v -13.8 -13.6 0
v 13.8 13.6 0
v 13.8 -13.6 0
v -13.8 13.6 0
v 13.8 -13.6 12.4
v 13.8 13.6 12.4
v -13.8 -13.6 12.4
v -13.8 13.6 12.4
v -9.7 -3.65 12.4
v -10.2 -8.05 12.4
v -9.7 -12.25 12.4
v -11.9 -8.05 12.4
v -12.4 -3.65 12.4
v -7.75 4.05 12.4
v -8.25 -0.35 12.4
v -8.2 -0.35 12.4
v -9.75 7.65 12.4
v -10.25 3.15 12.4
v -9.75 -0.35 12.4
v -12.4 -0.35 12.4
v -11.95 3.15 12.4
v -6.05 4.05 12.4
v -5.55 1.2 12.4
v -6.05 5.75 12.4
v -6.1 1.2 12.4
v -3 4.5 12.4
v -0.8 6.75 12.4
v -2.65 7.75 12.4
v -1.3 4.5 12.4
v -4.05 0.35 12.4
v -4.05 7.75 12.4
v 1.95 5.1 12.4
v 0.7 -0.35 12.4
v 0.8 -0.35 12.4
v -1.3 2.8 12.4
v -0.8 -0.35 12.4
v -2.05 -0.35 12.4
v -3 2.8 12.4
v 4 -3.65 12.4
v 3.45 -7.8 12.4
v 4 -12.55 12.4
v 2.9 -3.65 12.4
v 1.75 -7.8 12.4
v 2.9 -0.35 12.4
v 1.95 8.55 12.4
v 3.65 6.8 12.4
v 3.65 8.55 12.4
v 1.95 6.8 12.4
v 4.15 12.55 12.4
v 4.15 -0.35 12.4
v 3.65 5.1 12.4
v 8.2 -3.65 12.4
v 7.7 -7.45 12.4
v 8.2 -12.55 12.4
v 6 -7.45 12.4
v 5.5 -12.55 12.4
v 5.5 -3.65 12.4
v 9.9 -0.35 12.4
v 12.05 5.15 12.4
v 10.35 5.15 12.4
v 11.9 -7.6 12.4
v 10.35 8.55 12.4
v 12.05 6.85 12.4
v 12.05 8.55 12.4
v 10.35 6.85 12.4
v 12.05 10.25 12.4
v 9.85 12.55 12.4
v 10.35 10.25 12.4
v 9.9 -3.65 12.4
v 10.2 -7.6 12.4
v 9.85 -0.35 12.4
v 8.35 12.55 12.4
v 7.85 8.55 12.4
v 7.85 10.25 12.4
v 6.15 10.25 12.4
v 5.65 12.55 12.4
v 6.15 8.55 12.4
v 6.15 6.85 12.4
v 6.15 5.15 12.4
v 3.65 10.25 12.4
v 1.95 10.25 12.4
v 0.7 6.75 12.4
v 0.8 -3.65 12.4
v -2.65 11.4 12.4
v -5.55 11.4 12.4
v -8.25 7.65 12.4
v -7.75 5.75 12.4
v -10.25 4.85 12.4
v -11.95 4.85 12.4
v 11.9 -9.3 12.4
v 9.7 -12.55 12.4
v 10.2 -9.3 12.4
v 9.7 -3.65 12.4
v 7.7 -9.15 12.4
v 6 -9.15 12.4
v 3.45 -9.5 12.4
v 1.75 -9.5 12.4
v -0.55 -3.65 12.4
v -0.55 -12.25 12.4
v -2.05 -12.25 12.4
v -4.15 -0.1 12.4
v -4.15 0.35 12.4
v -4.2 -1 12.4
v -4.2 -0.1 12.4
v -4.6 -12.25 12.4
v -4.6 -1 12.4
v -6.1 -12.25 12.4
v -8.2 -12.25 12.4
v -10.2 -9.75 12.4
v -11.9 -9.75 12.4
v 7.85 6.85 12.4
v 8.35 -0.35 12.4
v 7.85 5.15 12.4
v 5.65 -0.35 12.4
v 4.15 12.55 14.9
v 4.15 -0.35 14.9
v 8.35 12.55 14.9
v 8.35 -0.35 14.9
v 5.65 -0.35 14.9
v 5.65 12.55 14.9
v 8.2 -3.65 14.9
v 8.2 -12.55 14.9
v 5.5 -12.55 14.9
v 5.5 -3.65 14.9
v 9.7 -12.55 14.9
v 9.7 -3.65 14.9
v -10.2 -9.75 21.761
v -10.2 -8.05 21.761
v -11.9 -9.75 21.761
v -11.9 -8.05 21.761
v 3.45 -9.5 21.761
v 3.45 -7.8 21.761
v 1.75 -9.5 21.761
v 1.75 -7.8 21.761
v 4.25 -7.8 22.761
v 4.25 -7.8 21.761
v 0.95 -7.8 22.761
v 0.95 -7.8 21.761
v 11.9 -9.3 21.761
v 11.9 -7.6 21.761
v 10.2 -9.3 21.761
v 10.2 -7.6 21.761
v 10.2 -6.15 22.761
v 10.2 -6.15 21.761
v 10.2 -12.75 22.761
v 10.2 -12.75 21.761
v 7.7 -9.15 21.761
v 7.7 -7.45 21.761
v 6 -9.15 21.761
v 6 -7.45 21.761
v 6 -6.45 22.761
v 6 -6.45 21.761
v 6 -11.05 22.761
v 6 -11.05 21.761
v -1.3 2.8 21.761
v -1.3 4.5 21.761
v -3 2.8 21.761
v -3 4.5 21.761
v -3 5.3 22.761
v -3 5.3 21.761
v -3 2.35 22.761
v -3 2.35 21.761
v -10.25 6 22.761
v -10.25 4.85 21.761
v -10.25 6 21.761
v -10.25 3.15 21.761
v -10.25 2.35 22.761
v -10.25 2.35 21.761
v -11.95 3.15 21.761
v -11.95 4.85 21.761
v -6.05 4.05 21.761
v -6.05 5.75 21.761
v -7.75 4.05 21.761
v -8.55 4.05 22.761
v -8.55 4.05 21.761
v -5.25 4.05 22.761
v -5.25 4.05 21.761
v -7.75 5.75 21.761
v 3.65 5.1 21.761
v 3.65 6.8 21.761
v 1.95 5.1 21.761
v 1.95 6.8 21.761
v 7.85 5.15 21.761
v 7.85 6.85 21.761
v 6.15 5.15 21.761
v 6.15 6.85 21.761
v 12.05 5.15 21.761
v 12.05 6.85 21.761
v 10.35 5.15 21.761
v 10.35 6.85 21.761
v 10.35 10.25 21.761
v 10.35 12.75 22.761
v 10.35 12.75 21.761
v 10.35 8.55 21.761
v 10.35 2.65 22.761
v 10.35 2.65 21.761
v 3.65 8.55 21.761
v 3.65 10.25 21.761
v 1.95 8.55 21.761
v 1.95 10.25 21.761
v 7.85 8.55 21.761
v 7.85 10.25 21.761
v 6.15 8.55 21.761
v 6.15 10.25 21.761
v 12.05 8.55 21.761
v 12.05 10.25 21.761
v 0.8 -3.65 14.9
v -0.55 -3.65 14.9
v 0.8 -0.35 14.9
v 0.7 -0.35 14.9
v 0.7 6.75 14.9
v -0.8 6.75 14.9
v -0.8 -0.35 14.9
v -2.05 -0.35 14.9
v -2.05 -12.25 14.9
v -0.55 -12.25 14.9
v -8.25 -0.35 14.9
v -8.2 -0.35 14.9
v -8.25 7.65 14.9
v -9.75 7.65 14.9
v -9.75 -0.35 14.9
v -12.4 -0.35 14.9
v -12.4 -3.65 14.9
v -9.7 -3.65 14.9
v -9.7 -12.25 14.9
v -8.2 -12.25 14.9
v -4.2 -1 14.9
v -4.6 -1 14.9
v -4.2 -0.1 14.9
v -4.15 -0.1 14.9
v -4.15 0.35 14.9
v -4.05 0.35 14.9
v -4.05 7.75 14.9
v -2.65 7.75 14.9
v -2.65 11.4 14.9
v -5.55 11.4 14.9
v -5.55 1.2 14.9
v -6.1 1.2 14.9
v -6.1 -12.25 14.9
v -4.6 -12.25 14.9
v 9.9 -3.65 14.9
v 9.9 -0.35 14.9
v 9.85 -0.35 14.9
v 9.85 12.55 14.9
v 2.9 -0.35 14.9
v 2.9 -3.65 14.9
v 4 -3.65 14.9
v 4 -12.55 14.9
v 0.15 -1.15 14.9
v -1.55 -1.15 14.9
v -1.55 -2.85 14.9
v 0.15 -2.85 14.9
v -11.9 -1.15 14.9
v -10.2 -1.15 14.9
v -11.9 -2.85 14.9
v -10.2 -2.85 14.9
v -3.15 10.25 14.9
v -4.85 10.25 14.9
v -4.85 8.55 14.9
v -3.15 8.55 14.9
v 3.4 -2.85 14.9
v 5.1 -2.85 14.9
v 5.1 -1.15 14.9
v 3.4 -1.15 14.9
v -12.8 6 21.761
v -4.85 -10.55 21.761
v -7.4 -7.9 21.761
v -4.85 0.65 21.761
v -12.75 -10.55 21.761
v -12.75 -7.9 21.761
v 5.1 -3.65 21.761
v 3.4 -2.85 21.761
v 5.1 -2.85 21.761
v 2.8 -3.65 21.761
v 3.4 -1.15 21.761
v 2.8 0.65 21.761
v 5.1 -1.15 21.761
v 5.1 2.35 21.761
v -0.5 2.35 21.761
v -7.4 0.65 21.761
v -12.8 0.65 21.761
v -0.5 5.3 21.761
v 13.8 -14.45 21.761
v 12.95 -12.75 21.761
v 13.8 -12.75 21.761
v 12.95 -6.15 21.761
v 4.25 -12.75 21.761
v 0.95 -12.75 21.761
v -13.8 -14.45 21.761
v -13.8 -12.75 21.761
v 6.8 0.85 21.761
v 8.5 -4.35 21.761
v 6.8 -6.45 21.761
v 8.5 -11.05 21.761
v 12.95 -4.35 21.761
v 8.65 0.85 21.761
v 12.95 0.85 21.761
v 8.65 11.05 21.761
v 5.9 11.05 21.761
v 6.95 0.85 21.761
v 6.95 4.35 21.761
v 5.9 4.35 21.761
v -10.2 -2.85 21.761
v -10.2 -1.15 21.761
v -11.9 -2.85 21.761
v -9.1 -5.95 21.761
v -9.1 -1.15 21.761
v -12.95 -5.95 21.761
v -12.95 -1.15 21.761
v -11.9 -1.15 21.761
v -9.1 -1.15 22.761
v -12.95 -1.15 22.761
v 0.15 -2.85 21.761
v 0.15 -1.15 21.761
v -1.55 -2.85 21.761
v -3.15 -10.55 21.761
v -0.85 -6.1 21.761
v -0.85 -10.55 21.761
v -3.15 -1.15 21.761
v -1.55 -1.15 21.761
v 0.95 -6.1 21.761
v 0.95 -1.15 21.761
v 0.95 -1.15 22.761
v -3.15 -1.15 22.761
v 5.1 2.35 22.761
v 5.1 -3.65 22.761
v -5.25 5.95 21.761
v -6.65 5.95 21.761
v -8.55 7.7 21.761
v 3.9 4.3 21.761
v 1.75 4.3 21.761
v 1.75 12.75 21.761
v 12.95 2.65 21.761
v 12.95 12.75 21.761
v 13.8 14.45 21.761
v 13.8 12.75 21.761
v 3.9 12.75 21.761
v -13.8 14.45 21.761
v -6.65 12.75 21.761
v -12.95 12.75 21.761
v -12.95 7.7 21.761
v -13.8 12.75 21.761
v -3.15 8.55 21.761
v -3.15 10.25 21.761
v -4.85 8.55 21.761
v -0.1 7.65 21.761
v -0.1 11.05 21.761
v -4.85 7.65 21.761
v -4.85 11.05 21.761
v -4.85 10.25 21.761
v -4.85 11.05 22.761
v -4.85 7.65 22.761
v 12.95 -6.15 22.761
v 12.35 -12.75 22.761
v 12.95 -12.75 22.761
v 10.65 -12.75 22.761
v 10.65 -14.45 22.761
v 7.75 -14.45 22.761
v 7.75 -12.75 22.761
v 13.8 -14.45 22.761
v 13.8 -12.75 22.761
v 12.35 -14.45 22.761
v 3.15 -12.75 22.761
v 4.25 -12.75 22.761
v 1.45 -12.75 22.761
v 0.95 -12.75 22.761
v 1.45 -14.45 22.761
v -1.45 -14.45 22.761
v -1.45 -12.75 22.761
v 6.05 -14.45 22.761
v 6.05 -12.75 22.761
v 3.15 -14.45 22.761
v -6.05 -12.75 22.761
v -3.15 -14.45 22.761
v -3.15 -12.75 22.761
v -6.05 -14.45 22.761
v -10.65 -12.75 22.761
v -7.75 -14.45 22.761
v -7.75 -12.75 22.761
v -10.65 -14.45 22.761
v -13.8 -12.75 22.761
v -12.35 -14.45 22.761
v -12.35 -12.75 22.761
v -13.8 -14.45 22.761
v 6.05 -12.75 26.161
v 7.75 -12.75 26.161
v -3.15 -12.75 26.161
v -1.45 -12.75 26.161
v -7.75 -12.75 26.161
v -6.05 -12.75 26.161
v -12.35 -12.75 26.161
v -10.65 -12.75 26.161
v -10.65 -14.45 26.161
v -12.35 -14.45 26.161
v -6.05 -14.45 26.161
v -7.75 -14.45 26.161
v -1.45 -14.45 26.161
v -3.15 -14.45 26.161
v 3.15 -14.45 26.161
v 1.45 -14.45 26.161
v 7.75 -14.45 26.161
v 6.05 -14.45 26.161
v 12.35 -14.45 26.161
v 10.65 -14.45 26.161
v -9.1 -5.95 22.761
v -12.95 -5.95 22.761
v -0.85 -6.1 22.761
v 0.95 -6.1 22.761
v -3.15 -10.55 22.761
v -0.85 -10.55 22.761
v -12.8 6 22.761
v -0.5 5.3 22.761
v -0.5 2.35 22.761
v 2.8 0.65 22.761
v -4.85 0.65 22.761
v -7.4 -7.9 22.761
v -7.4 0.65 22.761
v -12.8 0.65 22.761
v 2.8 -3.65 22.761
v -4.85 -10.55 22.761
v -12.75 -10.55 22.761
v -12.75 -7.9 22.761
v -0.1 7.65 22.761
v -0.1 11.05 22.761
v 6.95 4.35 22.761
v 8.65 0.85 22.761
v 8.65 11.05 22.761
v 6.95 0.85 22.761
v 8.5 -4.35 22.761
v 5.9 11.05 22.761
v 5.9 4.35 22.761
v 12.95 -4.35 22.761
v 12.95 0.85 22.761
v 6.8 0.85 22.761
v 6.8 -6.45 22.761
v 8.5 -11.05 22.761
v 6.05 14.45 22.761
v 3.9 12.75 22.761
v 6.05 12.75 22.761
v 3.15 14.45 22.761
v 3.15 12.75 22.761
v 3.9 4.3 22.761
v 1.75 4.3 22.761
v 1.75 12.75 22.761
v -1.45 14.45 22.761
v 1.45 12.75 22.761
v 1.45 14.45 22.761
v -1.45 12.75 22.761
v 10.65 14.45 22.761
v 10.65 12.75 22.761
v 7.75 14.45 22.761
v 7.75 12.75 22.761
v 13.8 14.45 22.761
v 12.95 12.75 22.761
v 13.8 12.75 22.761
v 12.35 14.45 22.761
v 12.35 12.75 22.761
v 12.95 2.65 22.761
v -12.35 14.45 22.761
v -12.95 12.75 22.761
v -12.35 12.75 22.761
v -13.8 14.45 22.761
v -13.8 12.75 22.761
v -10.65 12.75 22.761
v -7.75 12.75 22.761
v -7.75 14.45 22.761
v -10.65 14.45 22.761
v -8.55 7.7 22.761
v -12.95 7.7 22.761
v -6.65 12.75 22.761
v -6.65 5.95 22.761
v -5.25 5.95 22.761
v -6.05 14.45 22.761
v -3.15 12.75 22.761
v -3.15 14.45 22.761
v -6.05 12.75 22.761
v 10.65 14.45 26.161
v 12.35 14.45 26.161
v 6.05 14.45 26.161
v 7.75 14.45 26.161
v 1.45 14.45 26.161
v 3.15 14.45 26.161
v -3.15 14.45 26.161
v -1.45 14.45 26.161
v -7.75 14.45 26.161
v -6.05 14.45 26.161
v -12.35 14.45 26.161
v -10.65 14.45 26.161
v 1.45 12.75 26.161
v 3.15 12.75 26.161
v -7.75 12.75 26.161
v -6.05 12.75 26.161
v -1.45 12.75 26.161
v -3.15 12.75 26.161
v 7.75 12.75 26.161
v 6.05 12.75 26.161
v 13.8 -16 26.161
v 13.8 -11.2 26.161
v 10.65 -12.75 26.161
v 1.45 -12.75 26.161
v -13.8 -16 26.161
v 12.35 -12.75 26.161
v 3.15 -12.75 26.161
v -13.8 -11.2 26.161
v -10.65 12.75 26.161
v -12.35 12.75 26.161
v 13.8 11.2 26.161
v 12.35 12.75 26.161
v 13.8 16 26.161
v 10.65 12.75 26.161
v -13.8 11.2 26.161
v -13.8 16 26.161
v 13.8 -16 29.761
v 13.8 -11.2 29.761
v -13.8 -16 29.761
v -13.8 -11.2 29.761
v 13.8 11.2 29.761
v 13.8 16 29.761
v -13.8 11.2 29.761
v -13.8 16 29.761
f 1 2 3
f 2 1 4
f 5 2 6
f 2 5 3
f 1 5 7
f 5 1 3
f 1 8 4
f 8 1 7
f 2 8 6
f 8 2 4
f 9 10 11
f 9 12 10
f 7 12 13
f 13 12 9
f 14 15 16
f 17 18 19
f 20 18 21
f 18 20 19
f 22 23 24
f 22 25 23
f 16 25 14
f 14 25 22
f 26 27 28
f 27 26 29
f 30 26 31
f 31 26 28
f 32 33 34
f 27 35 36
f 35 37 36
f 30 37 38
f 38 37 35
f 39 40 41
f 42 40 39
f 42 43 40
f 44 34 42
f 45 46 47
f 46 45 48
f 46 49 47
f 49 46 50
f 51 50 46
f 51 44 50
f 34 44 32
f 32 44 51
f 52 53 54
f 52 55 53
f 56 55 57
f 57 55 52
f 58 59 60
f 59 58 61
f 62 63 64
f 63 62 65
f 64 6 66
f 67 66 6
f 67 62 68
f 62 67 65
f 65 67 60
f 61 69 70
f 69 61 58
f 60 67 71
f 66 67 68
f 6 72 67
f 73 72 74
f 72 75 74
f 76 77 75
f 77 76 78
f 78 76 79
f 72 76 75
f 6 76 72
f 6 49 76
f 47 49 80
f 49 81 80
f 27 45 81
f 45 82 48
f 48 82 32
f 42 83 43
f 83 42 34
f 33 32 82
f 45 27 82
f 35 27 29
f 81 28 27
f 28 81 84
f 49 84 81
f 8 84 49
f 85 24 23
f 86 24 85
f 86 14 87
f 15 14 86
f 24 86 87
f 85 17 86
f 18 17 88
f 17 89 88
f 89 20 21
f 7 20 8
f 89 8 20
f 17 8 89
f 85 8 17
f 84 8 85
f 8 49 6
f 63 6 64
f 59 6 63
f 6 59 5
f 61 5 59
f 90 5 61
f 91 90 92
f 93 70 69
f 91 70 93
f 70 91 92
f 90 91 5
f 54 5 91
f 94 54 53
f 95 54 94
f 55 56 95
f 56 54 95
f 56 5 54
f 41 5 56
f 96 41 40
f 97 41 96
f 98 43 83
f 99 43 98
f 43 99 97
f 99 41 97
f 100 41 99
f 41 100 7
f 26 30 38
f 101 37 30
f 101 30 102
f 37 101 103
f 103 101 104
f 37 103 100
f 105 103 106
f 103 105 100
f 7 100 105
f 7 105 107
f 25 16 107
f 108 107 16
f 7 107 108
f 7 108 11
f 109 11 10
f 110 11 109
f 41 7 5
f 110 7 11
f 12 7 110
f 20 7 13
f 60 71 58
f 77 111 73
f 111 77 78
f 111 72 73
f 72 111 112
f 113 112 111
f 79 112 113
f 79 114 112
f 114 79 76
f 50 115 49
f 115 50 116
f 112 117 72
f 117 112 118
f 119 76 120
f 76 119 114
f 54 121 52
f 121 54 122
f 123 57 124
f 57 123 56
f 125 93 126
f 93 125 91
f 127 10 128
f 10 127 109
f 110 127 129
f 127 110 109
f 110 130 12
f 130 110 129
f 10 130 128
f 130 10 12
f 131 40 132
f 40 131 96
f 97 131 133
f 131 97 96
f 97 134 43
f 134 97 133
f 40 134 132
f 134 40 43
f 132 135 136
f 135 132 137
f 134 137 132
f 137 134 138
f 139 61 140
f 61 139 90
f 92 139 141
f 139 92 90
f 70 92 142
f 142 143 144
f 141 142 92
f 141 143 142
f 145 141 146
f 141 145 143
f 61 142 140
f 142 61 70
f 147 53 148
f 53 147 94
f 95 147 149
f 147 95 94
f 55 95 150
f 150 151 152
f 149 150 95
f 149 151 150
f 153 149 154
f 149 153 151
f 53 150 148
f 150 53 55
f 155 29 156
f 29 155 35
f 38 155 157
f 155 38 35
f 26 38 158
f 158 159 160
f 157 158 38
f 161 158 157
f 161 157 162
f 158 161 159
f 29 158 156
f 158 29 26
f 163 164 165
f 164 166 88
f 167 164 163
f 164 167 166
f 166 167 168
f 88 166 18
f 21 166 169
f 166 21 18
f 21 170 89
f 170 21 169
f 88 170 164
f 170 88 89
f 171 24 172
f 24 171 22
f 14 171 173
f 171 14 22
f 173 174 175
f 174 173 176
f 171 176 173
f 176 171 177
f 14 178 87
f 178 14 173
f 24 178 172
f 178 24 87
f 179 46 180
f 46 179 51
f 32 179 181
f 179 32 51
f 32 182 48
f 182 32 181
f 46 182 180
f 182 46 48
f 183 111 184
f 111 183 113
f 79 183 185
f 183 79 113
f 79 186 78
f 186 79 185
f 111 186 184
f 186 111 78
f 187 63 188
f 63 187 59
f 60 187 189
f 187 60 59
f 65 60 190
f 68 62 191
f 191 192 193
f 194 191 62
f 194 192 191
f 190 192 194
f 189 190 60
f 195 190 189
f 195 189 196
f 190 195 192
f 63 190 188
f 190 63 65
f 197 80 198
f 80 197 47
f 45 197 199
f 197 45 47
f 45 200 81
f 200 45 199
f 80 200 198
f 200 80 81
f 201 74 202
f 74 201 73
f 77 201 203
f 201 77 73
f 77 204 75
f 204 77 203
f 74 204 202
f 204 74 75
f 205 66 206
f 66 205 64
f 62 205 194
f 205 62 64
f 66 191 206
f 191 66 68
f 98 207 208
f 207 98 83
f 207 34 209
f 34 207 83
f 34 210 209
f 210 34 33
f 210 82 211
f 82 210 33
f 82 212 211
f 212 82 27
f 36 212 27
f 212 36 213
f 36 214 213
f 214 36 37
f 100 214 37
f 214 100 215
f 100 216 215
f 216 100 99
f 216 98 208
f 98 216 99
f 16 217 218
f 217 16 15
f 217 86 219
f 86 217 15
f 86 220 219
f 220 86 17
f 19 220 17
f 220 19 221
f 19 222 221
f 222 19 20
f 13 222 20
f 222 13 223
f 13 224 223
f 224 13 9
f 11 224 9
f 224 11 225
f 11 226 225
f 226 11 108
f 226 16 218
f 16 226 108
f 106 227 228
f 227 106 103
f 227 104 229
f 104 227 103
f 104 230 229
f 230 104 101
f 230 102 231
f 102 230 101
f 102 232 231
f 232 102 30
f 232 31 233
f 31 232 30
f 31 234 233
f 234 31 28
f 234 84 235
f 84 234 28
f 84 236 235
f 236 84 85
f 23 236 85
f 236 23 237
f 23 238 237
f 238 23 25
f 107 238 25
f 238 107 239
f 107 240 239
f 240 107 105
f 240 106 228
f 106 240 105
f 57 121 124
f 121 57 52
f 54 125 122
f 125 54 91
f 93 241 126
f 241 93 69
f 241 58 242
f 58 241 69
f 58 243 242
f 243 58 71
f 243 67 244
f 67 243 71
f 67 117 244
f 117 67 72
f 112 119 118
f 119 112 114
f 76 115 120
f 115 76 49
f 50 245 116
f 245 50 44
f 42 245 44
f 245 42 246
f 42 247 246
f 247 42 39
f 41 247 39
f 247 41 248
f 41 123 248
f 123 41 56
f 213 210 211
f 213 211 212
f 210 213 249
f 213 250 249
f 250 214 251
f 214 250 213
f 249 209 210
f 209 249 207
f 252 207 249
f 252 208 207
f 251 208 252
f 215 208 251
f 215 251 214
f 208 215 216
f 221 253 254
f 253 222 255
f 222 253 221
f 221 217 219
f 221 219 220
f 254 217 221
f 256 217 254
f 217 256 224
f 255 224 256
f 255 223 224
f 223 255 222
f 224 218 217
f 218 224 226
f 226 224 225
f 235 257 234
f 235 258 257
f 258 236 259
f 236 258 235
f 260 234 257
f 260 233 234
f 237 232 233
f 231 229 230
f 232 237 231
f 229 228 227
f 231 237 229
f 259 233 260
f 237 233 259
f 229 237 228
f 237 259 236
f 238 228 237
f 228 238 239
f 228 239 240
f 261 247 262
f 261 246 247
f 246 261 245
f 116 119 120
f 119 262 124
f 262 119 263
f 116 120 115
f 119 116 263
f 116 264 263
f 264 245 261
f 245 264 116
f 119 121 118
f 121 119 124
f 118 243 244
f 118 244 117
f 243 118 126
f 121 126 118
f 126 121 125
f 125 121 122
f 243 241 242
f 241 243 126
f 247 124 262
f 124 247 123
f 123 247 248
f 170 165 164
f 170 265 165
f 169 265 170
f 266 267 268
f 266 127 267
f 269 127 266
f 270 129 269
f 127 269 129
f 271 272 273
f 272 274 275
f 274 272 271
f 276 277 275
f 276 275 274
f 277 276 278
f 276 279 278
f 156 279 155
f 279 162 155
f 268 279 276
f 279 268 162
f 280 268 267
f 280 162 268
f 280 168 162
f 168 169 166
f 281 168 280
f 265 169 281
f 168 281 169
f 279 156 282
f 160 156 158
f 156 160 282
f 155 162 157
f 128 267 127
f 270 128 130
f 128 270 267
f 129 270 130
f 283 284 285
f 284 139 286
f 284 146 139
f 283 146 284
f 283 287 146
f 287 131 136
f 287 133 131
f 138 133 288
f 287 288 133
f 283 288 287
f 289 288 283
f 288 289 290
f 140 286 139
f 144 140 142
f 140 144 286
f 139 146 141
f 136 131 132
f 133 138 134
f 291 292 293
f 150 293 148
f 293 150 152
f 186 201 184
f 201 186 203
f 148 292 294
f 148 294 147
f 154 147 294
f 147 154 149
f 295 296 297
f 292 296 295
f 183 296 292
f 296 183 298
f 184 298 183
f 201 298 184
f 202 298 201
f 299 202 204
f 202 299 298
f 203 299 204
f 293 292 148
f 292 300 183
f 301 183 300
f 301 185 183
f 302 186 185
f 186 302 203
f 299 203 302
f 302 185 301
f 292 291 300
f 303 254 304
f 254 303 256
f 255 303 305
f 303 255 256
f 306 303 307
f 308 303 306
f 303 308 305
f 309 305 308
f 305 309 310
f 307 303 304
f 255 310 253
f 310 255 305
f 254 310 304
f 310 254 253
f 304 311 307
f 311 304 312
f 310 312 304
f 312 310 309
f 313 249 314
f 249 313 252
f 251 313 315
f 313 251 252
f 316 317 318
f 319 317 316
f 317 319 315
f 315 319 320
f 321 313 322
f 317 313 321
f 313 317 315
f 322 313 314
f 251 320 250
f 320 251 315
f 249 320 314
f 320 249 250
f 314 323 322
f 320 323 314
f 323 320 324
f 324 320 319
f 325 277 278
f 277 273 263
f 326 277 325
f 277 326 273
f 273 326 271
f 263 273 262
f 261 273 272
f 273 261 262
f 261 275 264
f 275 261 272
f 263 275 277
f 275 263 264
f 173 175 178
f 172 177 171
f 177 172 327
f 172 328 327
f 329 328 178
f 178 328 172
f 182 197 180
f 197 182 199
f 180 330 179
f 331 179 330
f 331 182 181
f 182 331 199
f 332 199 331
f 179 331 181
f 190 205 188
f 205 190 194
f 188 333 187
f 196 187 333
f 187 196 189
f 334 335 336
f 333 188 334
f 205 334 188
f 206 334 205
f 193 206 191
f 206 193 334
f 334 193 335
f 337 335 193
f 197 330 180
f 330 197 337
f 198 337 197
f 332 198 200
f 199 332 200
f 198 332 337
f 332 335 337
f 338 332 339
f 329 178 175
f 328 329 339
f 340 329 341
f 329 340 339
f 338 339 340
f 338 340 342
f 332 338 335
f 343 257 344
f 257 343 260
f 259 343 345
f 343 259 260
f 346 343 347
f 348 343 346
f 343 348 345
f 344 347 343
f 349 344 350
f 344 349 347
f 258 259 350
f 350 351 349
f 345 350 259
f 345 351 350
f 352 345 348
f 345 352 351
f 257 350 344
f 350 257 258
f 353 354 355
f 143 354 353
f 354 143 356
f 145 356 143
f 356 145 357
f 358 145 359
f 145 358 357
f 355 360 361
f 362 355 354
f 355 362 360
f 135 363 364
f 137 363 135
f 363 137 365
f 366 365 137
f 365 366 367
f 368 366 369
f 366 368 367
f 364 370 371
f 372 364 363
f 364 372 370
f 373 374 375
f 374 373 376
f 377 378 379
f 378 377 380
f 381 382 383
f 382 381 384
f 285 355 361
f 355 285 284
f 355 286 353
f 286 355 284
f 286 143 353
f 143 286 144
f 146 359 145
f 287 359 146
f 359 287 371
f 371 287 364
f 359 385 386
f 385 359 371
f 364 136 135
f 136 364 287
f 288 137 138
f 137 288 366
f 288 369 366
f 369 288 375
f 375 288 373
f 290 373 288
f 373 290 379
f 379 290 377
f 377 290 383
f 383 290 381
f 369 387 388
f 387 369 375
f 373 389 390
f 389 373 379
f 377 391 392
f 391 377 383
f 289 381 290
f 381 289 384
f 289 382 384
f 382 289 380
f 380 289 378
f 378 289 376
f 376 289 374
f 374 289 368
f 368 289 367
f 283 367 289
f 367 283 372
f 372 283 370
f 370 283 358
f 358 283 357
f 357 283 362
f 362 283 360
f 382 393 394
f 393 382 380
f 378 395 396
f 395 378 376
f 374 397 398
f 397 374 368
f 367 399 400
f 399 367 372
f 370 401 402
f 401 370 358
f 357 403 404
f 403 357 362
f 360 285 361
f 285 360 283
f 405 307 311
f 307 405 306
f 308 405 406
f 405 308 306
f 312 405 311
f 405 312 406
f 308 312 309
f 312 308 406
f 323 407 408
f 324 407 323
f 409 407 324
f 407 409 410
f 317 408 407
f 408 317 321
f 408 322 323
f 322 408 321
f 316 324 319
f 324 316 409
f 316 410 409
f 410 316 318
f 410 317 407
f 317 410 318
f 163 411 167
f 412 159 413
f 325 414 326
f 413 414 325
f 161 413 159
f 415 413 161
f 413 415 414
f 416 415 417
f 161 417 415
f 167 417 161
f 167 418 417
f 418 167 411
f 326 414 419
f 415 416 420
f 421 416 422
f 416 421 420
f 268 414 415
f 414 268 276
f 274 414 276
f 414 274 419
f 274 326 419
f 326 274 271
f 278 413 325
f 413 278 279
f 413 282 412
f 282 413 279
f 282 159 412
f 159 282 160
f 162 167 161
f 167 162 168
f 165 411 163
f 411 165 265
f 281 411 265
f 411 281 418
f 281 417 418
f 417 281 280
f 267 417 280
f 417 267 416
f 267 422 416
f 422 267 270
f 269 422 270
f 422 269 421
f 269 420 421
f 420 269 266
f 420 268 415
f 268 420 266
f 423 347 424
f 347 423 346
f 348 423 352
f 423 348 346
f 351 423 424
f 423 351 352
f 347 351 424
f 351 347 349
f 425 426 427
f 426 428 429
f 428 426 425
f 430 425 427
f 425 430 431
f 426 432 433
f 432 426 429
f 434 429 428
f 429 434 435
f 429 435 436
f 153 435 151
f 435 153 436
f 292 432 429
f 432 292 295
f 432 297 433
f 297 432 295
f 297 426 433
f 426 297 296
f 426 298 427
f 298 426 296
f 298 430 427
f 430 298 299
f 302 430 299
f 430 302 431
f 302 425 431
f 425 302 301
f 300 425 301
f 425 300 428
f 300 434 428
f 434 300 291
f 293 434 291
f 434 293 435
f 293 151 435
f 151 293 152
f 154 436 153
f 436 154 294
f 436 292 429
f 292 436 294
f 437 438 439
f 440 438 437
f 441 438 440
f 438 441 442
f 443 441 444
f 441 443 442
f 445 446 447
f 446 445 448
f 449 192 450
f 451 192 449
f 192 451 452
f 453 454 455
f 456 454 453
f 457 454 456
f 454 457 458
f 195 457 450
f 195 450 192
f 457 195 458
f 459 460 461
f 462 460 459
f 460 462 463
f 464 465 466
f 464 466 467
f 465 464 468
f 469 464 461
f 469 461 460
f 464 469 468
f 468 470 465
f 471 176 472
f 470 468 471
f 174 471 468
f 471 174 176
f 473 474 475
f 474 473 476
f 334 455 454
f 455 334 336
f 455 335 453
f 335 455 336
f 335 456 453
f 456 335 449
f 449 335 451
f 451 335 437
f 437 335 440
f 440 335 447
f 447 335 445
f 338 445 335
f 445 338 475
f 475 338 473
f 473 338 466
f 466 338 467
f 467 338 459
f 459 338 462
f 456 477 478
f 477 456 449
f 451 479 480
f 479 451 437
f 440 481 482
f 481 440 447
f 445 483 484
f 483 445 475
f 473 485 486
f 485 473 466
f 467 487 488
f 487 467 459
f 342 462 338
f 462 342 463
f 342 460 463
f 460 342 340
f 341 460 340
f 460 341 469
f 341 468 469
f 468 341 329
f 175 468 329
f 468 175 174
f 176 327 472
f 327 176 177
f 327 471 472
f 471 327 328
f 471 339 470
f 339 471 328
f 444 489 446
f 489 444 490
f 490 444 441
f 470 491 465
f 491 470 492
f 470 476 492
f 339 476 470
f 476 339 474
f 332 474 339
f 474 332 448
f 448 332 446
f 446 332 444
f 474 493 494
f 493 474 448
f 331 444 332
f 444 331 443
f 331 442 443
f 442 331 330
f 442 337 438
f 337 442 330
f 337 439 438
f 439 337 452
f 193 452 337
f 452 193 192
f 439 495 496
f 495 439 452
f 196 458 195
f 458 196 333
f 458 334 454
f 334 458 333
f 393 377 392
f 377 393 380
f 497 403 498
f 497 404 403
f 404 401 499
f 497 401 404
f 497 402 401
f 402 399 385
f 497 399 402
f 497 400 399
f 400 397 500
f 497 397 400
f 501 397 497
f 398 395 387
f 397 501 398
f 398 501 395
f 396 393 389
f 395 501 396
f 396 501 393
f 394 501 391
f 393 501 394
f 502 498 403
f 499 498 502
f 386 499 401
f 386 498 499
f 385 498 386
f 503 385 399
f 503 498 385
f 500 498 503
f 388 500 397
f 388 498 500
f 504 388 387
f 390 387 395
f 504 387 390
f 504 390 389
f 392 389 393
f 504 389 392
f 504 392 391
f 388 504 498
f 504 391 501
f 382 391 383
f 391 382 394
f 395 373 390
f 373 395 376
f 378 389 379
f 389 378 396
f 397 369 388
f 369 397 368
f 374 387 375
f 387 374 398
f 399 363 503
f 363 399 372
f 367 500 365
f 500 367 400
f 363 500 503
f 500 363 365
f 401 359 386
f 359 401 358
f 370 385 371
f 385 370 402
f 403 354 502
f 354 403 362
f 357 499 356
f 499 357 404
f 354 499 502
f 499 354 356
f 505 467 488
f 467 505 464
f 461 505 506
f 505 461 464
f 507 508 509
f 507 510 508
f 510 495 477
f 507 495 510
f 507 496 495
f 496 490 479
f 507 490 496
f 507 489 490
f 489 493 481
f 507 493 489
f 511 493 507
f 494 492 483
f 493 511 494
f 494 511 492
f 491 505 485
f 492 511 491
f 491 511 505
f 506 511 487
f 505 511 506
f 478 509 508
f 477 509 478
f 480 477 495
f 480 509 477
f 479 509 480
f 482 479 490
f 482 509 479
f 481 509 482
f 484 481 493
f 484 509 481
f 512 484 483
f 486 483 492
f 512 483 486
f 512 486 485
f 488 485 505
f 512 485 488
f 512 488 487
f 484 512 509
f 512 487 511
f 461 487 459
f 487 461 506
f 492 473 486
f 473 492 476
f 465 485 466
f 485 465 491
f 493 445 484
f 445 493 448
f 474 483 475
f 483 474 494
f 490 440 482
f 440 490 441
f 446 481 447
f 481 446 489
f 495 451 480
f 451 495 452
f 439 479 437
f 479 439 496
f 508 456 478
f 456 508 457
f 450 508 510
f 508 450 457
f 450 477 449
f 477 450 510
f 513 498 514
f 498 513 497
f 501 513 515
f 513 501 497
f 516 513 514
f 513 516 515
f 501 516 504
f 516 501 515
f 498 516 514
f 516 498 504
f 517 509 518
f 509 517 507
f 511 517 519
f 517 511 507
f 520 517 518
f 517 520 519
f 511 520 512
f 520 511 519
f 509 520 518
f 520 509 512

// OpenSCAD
// Generated by SolidPython 0.4.2 on 2020-09-29 23:20:07
//!OpenSCAD

scale(v = 0.0100000000) {
	translate(v = [-1380, -1360, 0]) {
		union() {
			color(c = [0.4000000000, 0.4000000000, 0.4000000000]) {
				translate(v = [0, 0, 0]) {
					linear_extrude(height = 1000.0000000000) {
						polygon(paths = [[0, 1, 2, 3]], points = [[0, 0], [0, 2720], [2760, 2720], [2760, 0]]);
					}
				}
			}
			color(c = [0.2000000000, 0.6000000000, 0.2000000000]) {
				translate(v = [0, 0, 1000.0000000000]) {
					linear_extrude(height = 120.0000000000) {
						polygon(paths = [[0, 1, 2, 3]], points = [[0, 1305], [0, 2720], [2760, 2720], [2760, 1305]]);
					}
				}
			}
			color(c = [0.4000000000, 0.4000000000, 0.4000000000]) {
				translate(v = [0, 0, 1000.0000000000]) {
					linear_extrude(height = 120.0000000000) {
						polygon(paths = [[0, 1, 2, 3]], points = [[0, 0], [0, 1305], [2760, 1305], [2760, 0]]);
					}
				}
			}
			color(c = [0.9000000000, 0.6000000000, 0.6000000000]) {
				translate(v = [0, 0, 1120.0000000000]) {
					linear_extrude(height = 120.0000000000) {
						polygon(paths = [[0, 1, 2, 3]], points = [[145, 1555], [145, 1975], [405, 1975], [405, 1555]]);
					}
				}
			}
			color(c = [0.9000000000, 0.6000000000, 0.6000000000]) {
				translate(v = [0, 0, 1120.0000000000]) {
					linear_extrude(height = 120.0000000000) {
						polygon(paths = [[0, 1, 2, 3]], points = [[555, 1555], [555, 1975], [825, 1975], [825, 1555]]);
					}
				}
			}
			color(c = [0.9000000000, 0.6000000000, 0.6000000000]) {
				translate(v = [0, 0, 1120.0000000000]) {
					linear_extrude(height = 120.0000000000) {
						polygon(paths = [[0, 1, 2, 3, 4, 5, 6, 7]], points = [[1050, 1485], [1050, 1555], [975, 1555], [975, 1975], [1225, 1975], [1225, 1905], [1300, 1905], [1300, 1485]]);
					}
				}
			}
			color(c = [0.9000000000, 0.6000000000, 0.6000000000]) {
				translate(v = [0, 0, 1120.0000000000]) {
					linear_extrude(height = 120.0000000000) {
						polygon(paths = [[0, 1, 2, 3, 4, 5]], points = [[1450, 1485], [1450, 1905], [1525, 1905], [1525, 2485], [1795, 2485], [1795, 1485]]);
					}
				}
			}
			color(c = [0.9000000000, 0.6000000000, 0.6000000000]) {
				translate(v = [0, 0, 1120.0000000000]) {
					linear_extrude(height = 120.0000000000) {
						polygon(paths = [[0, 1, 2, 3]], points = [[1945, 1485], [1945, 2485], [2215, 2485], [2215, 1485]]);
					}
				}
			}
			color(c = [0.9000000000, 0.6000000000, 0.6000000000]) {
				translate(v = [0, 0, 1120.0000000000]) {
					linear_extrude(height = 120.0000000000) {
						polygon(paths = [[0, 1, 2, 3]], points = [[2365, 1485], [2365, 2485], [2625, 2485], [2625, 1485]]);
					}
				}
			}
			color(c = [0.9000000000, 0.6000000000, 0.9000000000]) {
				translate(v = [0, 0, 1120.0000000000]) {
					linear_extrude(height = 120.0000000000) {
						polygon(paths = [[0, 1, 2, 3]], points = [[150, 265], [150, 685], [410, 685], [410, 265]]);
					}
				}
			}
			color(c = [0.9000000000, 0.6000000000, 0.9000000000]) {
				translate(v = [0, 0, 1120.0000000000]) {
					linear_extrude(height = 120.0000000000) {
						polygon(paths = [[0, 1, 2, 3]], points = [[560, 265], [560, 685], [770, 685], [770, 265]]);
					}
				}
			}
			color(c = [0.9000000000, 0.6000000000, 0.9000000000]) {
				translate(v = [0, 0, 1120.0000000000]) {
					linear_extrude(height = 120.0000000000) {
						polygon(paths = [[0, 1, 2, 3]], points = [[920, 265], [920, 685], [1175, 685], [1175, 265]]);
					}
				}
			}
			color(c = [0.9000000000, 0.6000000000, 0.9000000000]) {
				translate(v = [0, 0, 1120.0000000000]) {
					linear_extrude(height = 120.0000000000) {
						polygon(paths = [[0, 1, 2, 3, 4, 5, 6, 7]], points = [[1490, 235], [1490, 265], [1325, 265], [1325, 685], [1475, 685], [1475, 885], [1780, 885], [1780, 235]]);
					}
				}
			}
			color(c = [0.9000000000, 0.6000000000, 0.9000000000]) {
				translate(v = [0, 0, 1120.0000000000]) {
					linear_extrude(height = 120.0000000000) {
						polygon(paths = [[0, 1, 2, 3]], points = [[1930, 235], [1930, 885], [2200, 885], [2200, 235]]);
					}
				}
			}
			color(c = [0.9000000000, 0.6000000000, 0.9000000000]) {
				translate(v = [0, 0, 1120.0000000000]) {
					linear_extrude(height = 120.0000000000) {
						polygon(paths = [[0, 1, 2, 3]], points = [[2350, 235], [2350, 885], [2625, 885], [2625, 235]]);
					}
				}
			}
			color(c = [0.2000000000, 0.6000000000, 0.2000000000]) {
				translate(v = [0, 0, 1120.0000000000]) {
					linear_extrude(height = 120.0000000000) {
						difference() {
							polygon(paths = [[0, 1, 2, 3]], points = [[0, 1305], [0, 2720], [2760, 2720], [2760, 1305]]);
							polygon(paths = [[0, 1, 2, 3]], points = [[1945, 1485], [2215, 1485], [2215, 2485], [1945, 2485]]);
							polygon(paths = [[0, 1, 2, 3]], points = [[2365, 1485], [2625, 1485], [2625, 2485], [2365, 2485]]);
							polygon(paths = [[0, 1, 2, 3]], points = [[145, 1555], [405, 1555], [405, 1975], [145, 1975]]);
							polygon(paths = [[0, 1, 2, 3]], points = [[555, 1555], [825, 1555], [825, 1975], [555, 1975]]);
							polygon(paths = [[0, 1, 2, 3, 4, 5]], points = [[1450, 1485], [1795, 1485], [1795, 2485], [1525, 2485], [1525, 1905], [1450, 1905]]);
							polygon(paths = [[0, 1, 2, 3, 4, 5, 6, 7]], points = [[1050, 1485], [1300, 1485], [1300, 1905], [1225, 1905], [1225, 1975], [975, 1975], [975, 1555], [1050, 1555]]);
						}
					}
				}
			}
			color(c = [0.4000000000, 0.4000000000, 0.4000000000]) {
				translate(v = [0, 0, 1120.0000000000]) {
					linear_extrude(height = 120.0000000000) {
						difference() {
							polygon(paths = [[0, 1, 2, 3]], points = [[0, 0], [0, 1305], [2760, 1305], [2760, 0]]);
							polygon(paths = [[0, 1, 2, 3]], points = [[1930, 235], [2200, 235], [2200, 885], [1930, 885]]);
							polygon(paths = [[0, 1, 2, 3]], points = [[2350, 235], [2625, 235], [2625, 885], [2350, 885]]);
							polygon(paths = [[0, 1, 2, 3]], points = [[150, 265], [410, 265], [410, 685], [150, 685]]);
							polygon(paths = [[0, 1, 2, 3]], points = [[560, 265], [770, 265], [770, 685], [560, 685]]);
							polygon(paths = [[0, 1, 2, 3]], points = [[920, 265], [1175, 265], [1175, 685], [920, 685]]);
							polygon(paths = [[0, 1, 2, 3, 4, 5, 6, 7]], points = [[1490, 235], [1780, 235], [1780, 885], [1475, 885], [1475, 685], [1325, 685], [1325, 265], [1490, 265]]);
						}
					}
				}
			}
			color(c = [0.1000000000, 0.1000000000, 0.1000000000]) {
				translate(v = [0, 0, 1240.0000000000]) {
					linear_extrude(height = 70.0000000000) {
						polygon(paths = [[0, 1, 2, 3]], points = [[190, 385], [190, 555], [360, 555], [360, 385]]);
					}
				}
			}
			color(c = [0.1000000000, 0.1000000000, 0.1000000000]) {
				translate(v = [0, 0, 1240.0000000000]) {
					linear_extrude(height = 70.0000000000) {
						polygon(paths = [[0, 1, 2, 3]], points = [[1555, 410], [1555, 580], [1725, 580], [1725, 410]]);
					}
				}
			}
			color(c = [0.1000000000, 0.1000000000, 0.1000000000]) {
				translate(v = [0, 0, 1240.0000000000]) {
					linear_extrude(height = 70.0000000000) {
						polygon(paths = [[0, 1, 2, 3]], points = [[2400, 430], [2400, 600], [2570, 600], [2570, 430]]);
					}
				}
			}
			color(c = [0.1000000000, 0.1000000000, 0.1000000000]) {
				translate(v = [0, 0, 1240.0000000000]) {
					linear_extrude(height = 70.0000000000) {
						polygon(paths = [[0, 1, 2, 3]], points = [[1980, 445], [1980, 615], [2150, 615], [2150, 445]]);
					}
				}
			}
			color(c = [0.1000000000, 0.1000000000, 0.1000000000]) {
				translate(v = [0, 0, 1240.0000000000]) {
					linear_extrude(height = 70.0000000000) {
						polygon(paths = [[0, 1, 2, 3]], points = [[1080, 1640], [1080, 1810], [1250, 1810], [1250, 1640]]);
					}
				}
			}
			color(c = [0.1000000000, 0.1000000000, 0.1000000000]) {
				translate(v = [0, 0, 1240.0000000000]) {
					linear_extrude(height = 70.0000000000) {
						polygon(paths = [[0, 1, 2, 3]], points = [[185, 1675], [185, 1845], [355, 1845], [355, 1675]]);
					}
				}
			}
			color(c = [0.1000000000, 0.1000000000, 0.1000000000]) {
				translate(v = [0, 0, 1240.0000000000]) {
					linear_extrude(height = 70.0000000000) {
						polygon(paths = [[0, 1, 2, 3]], points = [[605, 1765], [605, 1935], [775, 1935], [775, 1765]]);
					}
				}
			}
			color(c = [0.1000000000, 0.1000000000, 0.1000000000]) {
				translate(v = [0, 0, 1240.0000000000]) {
					linear_extrude(height = 70.0000000000) {
						polygon(paths = [[0, 1, 2, 3]], points = [[1575, 1870], [1575, 2040], [1745, 2040], [1745, 1870]]);
					}
				}
			}
			color(c = [0.1000000000, 0.1000000000, 0.1000000000]) {
				translate(v = [0, 0, 1240.0000000000]) {
					linear_extrude(height = 70.0000000000) {
						polygon(paths = [[0, 1, 2, 3]], points = [[1995, 1875], [1995, 2045], [2165, 2045], [2165, 1875]]);
					}
				}
			}
			color(c = [0.1000000000, 0.1000000000, 0.1000000000]) {
				translate(v = [0, 0, 1240.0000000000]) {
					linear_extrude(height = 70.0000000000) {
						polygon(paths = [[0, 1, 2, 3]], points = [[2415, 1875], [2415, 2045], [2585, 2045], [2585, 1875]]);
					}
				}
			}
			color(c = [0.1000000000, 0.1000000000, 0.1000000000]) {
				translate(v = [0, 0, 1240.0000000000]) {
					linear_extrude(height = 70.0000000000) {
						polygon(paths = [[0, 1, 2, 3]], points = [[1575, 2215], [1575, 2385], [1745, 2385], [1745, 2215]]);
					}
				}
			}
			color(c = [0.1000000000, 0.1000000000, 0.1000000000]) {
				translate(v = [0, 0, 1240.0000000000]) {
					linear_extrude(height = 70.0000000000) {
						polygon(paths = [[0, 1, 2, 3]], points = [[1995, 2215], [1995, 2385], [2165, 2385], [2165, 2215]]);
					}
				}
			}
			color(c = [0.1000000000, 0.1000000000, 0.1000000000]) {
				translate(v = [0, 0, 1240.0000000000]) {
					linear_extrude(height = 70.0000000000) {
						polygon(paths = [[0, 1, 2, 3]], points = [[2415, 2215], [2415, 2385], [2585, 2385], [2585, 2215]]);
					}
				}
			}
			color(c = [1.0000000000, 1.0000000000, 1.0000000000]) {
				translate(v = [0, 0, 1240.0000000000]) {
					linear_extrude(height = 70.0000000000) {
						polygon(paths = [[0, 1, 2, 3, 4, 5, 6, 7, 8, 9]], points = [[1175, 135], [1175, 1325], [1300, 1325], [1300, 2035], [1450, 2035], [1450, 1325], [1460, 1325], [1460, 995], [1325, 995], [1325, 135]]);
					}
				}
			}
			color(c = [1.0000000000, 1.0000000000, 1.0000000000]) {
				translate(v = [0, 0, 1240.0000000000]) {
					linear_extrude(height = 70.0000000000) {
						polygon(paths = [[0, 1, 2, 3, 4, 5, 6, 7, 8, 9]], points = [[410, 135], [410, 995], [140, 995], [140, 1325], [405, 1325], [405, 2125], [555, 2125], [555, 1325], [560, 1325], [560, 135]]);
					}
				}
			}
			color(c = [1.0000000000, 1.0000000000, 1.0000000000]) {
				translate(v = [0, 0, 1240.0000000000]) {
					linear_extrude(height = 70.0000000000) {
						polygon(paths = [[0, 1, 2, 3, 4, 5, 6, 7, 8, 9, 10, 11, 12, 13]], points = [[770, 135], [770, 1480], [825, 1480], [825, 2500], [1115, 2500], [1115, 2135], [975, 2135], [975, 1395], [965, 1395], [965, 1350], [960, 1350], [960, 1260], [920, 1260], [920, 135]]);
					}
				}
			}
			color(c = [1.0000000000, 1.0000000000, 1.0000000000]) {
				translate(v = [0, 0, 1240.0000000000]) {
					linear_extrude(height = 70.0000000000) {
						polygon(paths = [[0, 1, 2, 3, 4, 5, 6, 7, 8, 9, 10, 11, 12, 13, 14, 15, 16, 17, 18, 19]], points = [[1780, 105], [1780, 995], [1670, 995], [1670, 1325], [1795, 1325], [1795, 2615], [1945, 2615], [1945, 1325], [2215, 1325], [2215, 2615], [2365, 2615], [2365, 1325], [2370, 1325], [2370, 995], [2350, 995], [2350, 105], [2200, 105], [2200, 995], [1930, 995], [1930, 105]]);
					}
				}
			}
			color(c = [0.1000000000, 0.1000000000, 0.1000000000]) {
				translate(v = [0, 0, 1310.0000000000]) {
					linear_extrude(height = 180.0000000000) {
						polygon(paths = [[0, 1, 2, 3]], points = [[190, 385], [190, 555], [360, 555], [360, 385]]);
					}
				}
			}
			color(c = [0.1000000000, 0.1000000000, 0.1000000000]) {
				translate(v = [0, 0, 1310.0000000000]) {
					linear_extrude(height = 180.0000000000) {
						polygon(paths = [[0, 1, 2, 3]], points = [[1555, 410], [1555, 580], [1725, 580], [1725, 410]]);
					}
				}
			}
			color(c = [0.1000000000, 0.1000000000, 0.1000000000]) {
				translate(v = [0, 0, 1310.0000000000]) {
					linear_extrude(height = 180.0000000000) {
						polygon(paths = [[0, 1, 2, 3]], points = [[2400, 430], [2400, 600], [2570, 600], [2570, 430]]);
					}
				}
			}
			color(c = [0.1000000000, 0.1000000000, 0.1000000000]) {
				translate(v = [0, 0, 1310.0000000000]) {
					linear_extrude(height = 180.0000000000) {
						polygon(paths = [[0, 1, 2, 3]], points = [[1980, 445], [1980, 615], [2150, 615], [2150, 445]]);
					}
				}
			}
			color(c = [0.1000000000, 0.1000000000, 0.1000000000]) {
				translate(v = [0, 0, 1310.0000000000]) {
					linear_extrude(height = 180.0000000000) {
						polygon(paths = [[0, 1, 2, 3]], points = [[1080, 1640], [1080, 1810], [1250, 1810], [1250, 1640]]);
					}
				}
			}
			color(c = [0.1000000000, 0.1000000000, 0.1000000000]) {
				translate(v = [0, 0, 1310.0000000000]) {
					linear_extrude(height = 180.0000000000) {
						polygon(paths = [[0, 1, 2, 3]], points = [[185, 1675], [185, 1845], [355, 1845], [355, 1675]]);
					}
				}
			}
			color(c = [0.1000000000, 0.1000000000, 0.1000000000]) {
				translate(v = [0, 0, 1310.0000000000]) {
					linear_extrude(height = 180.0000000000) {
						polygon(paths = [[0, 1, 2, 3]], points = [[605, 1765], [605, 1935], [775, 1935], [775, 1765]]);
					}
				}
			}
			color(c = [0.1000000000, 0.1000000000, 0.1000000000]) {
				translate(v = [0, 0, 1310.0000000000]) {
					linear_extrude(height = 180.0000000000) {
						polygon(paths = [[0, 1, 2, 3]], points = [[1575, 1870], [1575, 2040], [1745, 2040], [1745, 1870]]);
					}
				}
			}
			color(c = [0.1000000000, 0.1000000000, 0.1000000000]) {
				translate(v = [0, 0, 1310.0000000000]) {
					linear_extrude(height = 180.0000000000) {
						polygon(paths = [[0, 1, 2, 3]], points = [[1995, 1875], [1995, 2045], [2165, 2045], [2165, 1875]]);
					}
				}
			}
			color(c = [0.1000000000, 0.1000000000, 0.1000000000]) {
				translate(v = [0, 0, 1310.0000000000]) {
					linear_extrude(height = 180.0000000000) {
						polygon(paths = [[0, 1, 2, 3]], points = [[2415, 1875], [2415, 2045], [2585, 2045], [2585, 1875]]);
					}
				}
			}
			color(c = [0.1000000000, 0.1000000000, 0.1000000000]) {
				translate(v = [0, 0, 1310.0000000000]) {
					linear_extrude(height = 180.0000000000) {
						polygon(paths = [[0, 1, 2, 3]], points = [[1575, 2215], [1575, 2385], [1745, 2385], [1745, 2215]]);
					}
				}
			}
			color(c = [0.1000000000, 0.1000000000, 0.1000000000]) {
				translate(v = [0, 0, 1310.0000000000]) {
					linear_extrude(height = 180.0000000000) {
						polygon(paths = [[0, 1, 2, 3]], points = [[1995, 2215], [1995, 2385], [2165, 2385], [2165, 2215]]);
					}
				}
			}
			color(c = [0.1000000000, 0.1000000000, 0.1000000000]) {
				translate(v = [0, 0, 1310.0000000000]) {
					linear_extrude(height = 180.0000000000) {
						polygon(paths = [[0, 1, 2, 3]], points = [[2415, 2215], [2415, 2385], [2585, 2385], [2585, 2215]]);
					}
				}
			}
			color(c = [0.7000000000, 0, 0]) {
				translate(v = [0, 0, 1310.0000000000]) {
					linear_extrude(height = 180.0000000000) {
						polygon(paths = [[0, 1, 2, 3, 4, 5, 6, 7, 8, 9]], points = [[1175, 135], [1175, 1325], [1300, 1325], [1300, 2035], [1450, 2035], [1450, 1325], [1460, 1325], [1460, 995], [1325, 995], [1325, 135]]);
					}
				}
			}
			color(c = [0.7000000000, 0, 0]) {
				translate(v = [0, 0, 1310.0000000000]) {
					linear_extrude(height = 180.0000000000) {
						polygon(paths = [[0, 1, 2, 3, 4, 5, 6, 7, 8, 9]], points = [[410, 135], [410, 995], [140, 995], [140, 1325], [405, 1325], [405, 2125], [555, 2125], [555, 1325], [560, 1325], [560, 135]]);
					}
				}
			}
			color(c = [0.7000000000, 0, 0]) {
				translate(v = [0, 0, 1310.0000000000]) {
					linear_extrude(height = 180.0000000000) {
						polygon(paths = [[0, 1, 2, 3, 4, 5, 6, 7, 8, 9, 10, 11, 12, 13]], points = [[770, 135], [770, 1480], [825, 1480], [825, 2500], [1115, 2500], [1115, 2135], [975, 2135], [975, 1395], [965, 1395], [965, 1350], [960, 1350], [960, 1260], [920, 1260], [920, 135]]);
					}
				}
			}
			color(c = [0.7000000000, 0, 0]) {
				translate(v = [0, 0, 1310.0000000000]) {
					linear_extrude(height = 180.0000000000) {
						polygon(paths = [[0, 1, 2, 3, 4, 5, 6, 7, 8, 9, 10, 11, 12, 13, 14, 15, 16, 17, 18, 19]], points = [[1780, 105], [1780, 995], [1670, 995], [1670, 1325], [1795, 1325], [1795, 2615], [1945, 2615], [1945, 1325], [2215, 1325], [2215, 2615], [2365, 2615], [2365, 1325], [2370, 1325], [2370, 995], [2350, 995], [2350, 105], [2200, 105], [2200, 995], [1930, 995], [1930, 105]]);
					}
				}
			}
			color(c = [0.1000000000, 0.1000000000, 0.1000000000]) {
				translate(v = [0, 0, 1490.0000000000]) {
					linear_extrude(height = 686.1000000000) {
						polygon(paths = [[0, 1, 2, 3]], points = [[190, 385], [190, 555], [360, 555], [360, 385]]);
					}
				}
			}
			color(c = [0.1000000000, 0.1000000000, 0.1000000000]) {
				translate(v = [0, 0, 1490.0000000000]) {
					linear_extrude(height = 686.1000000000) {
						polygon(paths = [[0, 1, 2, 3]], points = [[1555, 410], [1555, 580], [1725, 580], [1725, 410]]);
					}
				}
			}
			color(c = [0.1000000000, 0.1000000000, 0.1000000000]) {
				translate(v = [0, 0, 1490.0000000000]) {
					linear_extrude(height = 686.1000000000) {
						polygon(paths = [[0, 1, 2, 3]], points = [[2400, 430], [2400, 600], [2570, 600], [2570, 430]]);
					}
				}
			}
			color(c = [0.1000000000, 0.1000000000, 0.1000000000]) {
				translate(v = [0, 0, 1490.0000000000]) {
					linear_extrude(height = 686.1000000000) {
						polygon(paths = [[0, 1, 2, 3]], points = [[1980, 445], [1980, 615], [2150, 615], [2150, 445]]);
					}
				}
			}
			color(c = [0.1000000000, 0.1000000000, 0.1000000000]) {
				translate(v = [0, 0, 1490.0000000000]) {
					linear_extrude(height = 686.1000000000) {
						polygon(paths = [[0, 1, 2, 3]], points = [[190, 1075], [190, 1245], [360, 1245], [360, 1075]]);
					}
				}
			}
			color(c = [0.1000000000, 0.1000000000, 0.1000000000]) {
				translate(v = [0, 0, 1490.0000000000]) {
					linear_extrude(height = 686.1000000000) {
						polygon(paths = [[0, 1, 2, 3]], points = [[1225, 1075], [1225, 1245], [1395, 1245], [1395, 1075]]);
					}
				}
			}
			color(c = [0.1000000000, 0.1000000000, 0.1000000000]) {
				translate(v = [0, 0, 1490.0000000000]) {
					linear_extrude(height = 686.1000000000) {
						polygon(paths = [[0, 1, 2, 3]], points = [[1720, 1075], [1720, 1245], [1890, 1245], [1890, 1075]]);
					}
				}
			}
			color(c = [0.1000000000, 0.1000000000, 0.1000000000]) {
				translate(v = [0, 0, 1490.0000000000]) {
					linear_extrude(height = 686.1000000000) {
						polygon(paths = [[0, 1, 2, 3]], points = [[1080, 1640], [1080, 1810], [1250, 1810], [1250, 1640]]);
					}
				}
			}
			color(c = [0.1000000000, 0.1000000000, 0.1000000000]) {
				translate(v = [0, 0, 1490.0000000000]) {
					linear_extrude(height = 686.1000000000) {
						polygon(paths = [[0, 1, 2, 3]], points = [[185, 1675], [185, 1845], [355, 1845], [355, 1675]]);
					}
				}
			}
			color(c = [0.1000000000, 0.1000000000, 0.1000000000]) {
				translate(v = [0, 0, 1490.0000000000]) {
					linear_extrude(height = 686.1000000000) {
						polygon(paths = [[0, 1, 2, 3]], points = [[605, 1765], [605, 1935], [775, 1935], [775, 1765]]);
					}
				}
			}
			color(c = [0.1000000000, 0.1000000000, 0.1000000000]) {
				translate(v = [0, 0, 1490.0000000000]) {
					linear_extrude(height = 686.1000000000) {
						polygon(paths = [[0, 1, 2, 3]], points = [[1575, 1870], [1575, 2040], [1745, 2040], [1745, 1870]]);
					}
				}
			}
			color(c = [0.1000000000, 0.1000000000, 0.1000000000]) {
				translate(v = [0, 0, 1490.0000000000]) {
					linear_extrude(height = 686.1000000000) {
						polygon(paths = [[0, 1, 2, 3]], points = [[1995, 1875], [1995, 2045], [2165, 2045], [2165, 1875]]);
					}
				}
			}
			color(c = [0.1000000000, 0.1000000000, 0.1000000000]) {
				translate(v = [0, 0, 1490.0000000000]) {
					linear_extrude(height = 686.1000000000) {
						polygon(paths = [[0, 1, 2, 3]], points = [[2415, 1875], [2415, 2045], [2585, 2045], [2585, 1875]]);
					}
				}
			}
			color(c = [0.1000000000, 0.1000000000, 0.1000000000]) {
				translate(v = [0, 0, 1490.0000000000]) {
					linear_extrude(height = 686.1000000000) {
						polygon(paths = [[0, 1, 2, 3]], points = [[895, 2215], [895, 2385], [1065, 2385], [1065, 2215]]);
					}
				}
			}
			color(c = [0.1000000000, 0.1000000000, 0.1000000000]) {
				translate(v = [0, 0, 1490.0000000000]) {
					linear_extrude(height = 686.1000000000) {
						polygon(paths = [[0, 1, 2, 3]], points = [[1575, 2215], [1575, 2385], [1745, 2385], [1745, 2215]]);
					}
				}
			}
			color(c = [0.1000000000, 0.1000000000, 0.1000000000]) {
				translate(v = [0, 0, 1490.0000000000]) {
					linear_extrude(height = 686.1000000000) {
						polygon(paths = [[0, 1, 2, 3]], points = [[1995, 2215], [1995, 2385], [2165, 2385], [2165, 2215]]);
					}
				}
			}
			color(c = [0.1000000000, 0.1000000000, 0.1000000000]) {
				translate(v = [0, 0, 1490.0000000000]) {
					linear_extrude(height = 686.1000000000) {
						polygon(paths = [[0, 1, 2, 3]], points = [[2415, 2215], [2415, 2385], [2585, 2385], [2585, 2215]]);
					}
				}
			}
			color(c = [0.9000000000, 0.6000000000, 0.6000000000]) {
				translate(v = [0, 0, 2176.1000000000]) {
					linear_extrude(height = 100.0000000000) {
						polygon(paths = [[0, 1, 2, 3, 4, 5, 6, 7, 8, 9, 10, 11]], points = [[0, -85], [0, 85], [1475, 85], [1475, 580], [1805, 580], [1805, 85], [2400, 85], [2400, 745], [2675, 745], [2675, 85], [2760, 85], [2760, -85]]);
					}
				}
			}
			color(c = [0.9000000000, 0.6000000000, 0.6000000000]) {
				translate(v = [0, 0, 2176.1000000000]) {
					linear_extrude(height = 100.0000000000) {
						polygon(paths = [[0, 1, 2, 3]], points = [[85, 765], [85, 1245], [470, 1245], [470, 765]]);
					}
				}
			}
			color(c = [0.9000000000, 0.6000000000, 0.6000000000]) {
				translate(v = [0, 0, 2176.1000000000]) {
					linear_extrude(height = 100.0000000000) {
						polygon(paths = [[0, 1, 2, 3, 4, 5]], points = [[1065, 305], [1065, 1245], [1475, 1245], [1475, 750], [1295, 750], [1295, 305]]);
					}
				}
			}
			color(c = [0.9000000000, 0.6000000000, 0.6000000000]) {
				translate(v = [0, 0, 2176.1000000000]) {
					linear_extrude(height = 100.0000000000) {
						polygon(paths = [[0, 1, 2, 3, 4, 5, 6, 7, 8, 9, 10, 11, 12, 13, 14, 15, 16, 17]], points = [[105, 305], [105, 570], [640, 570], [640, 1425], [100, 1425], [100, 1960], [355, 1960], [355, 1595], [1080, 1595], [1080, 1890], [1330, 1890], [1330, 1595], [1890, 1595], [1890, 995], [1660, 995], [1660, 1425], [895, 1425], [895, 305]]);
					}
				}
			}
			color(c = [0.9000000000, 0.6000000000, 0.6000000000]) {
				translate(v = [0, 0, 2176.1000000000]) {
					linear_extrude(height = 100.0000000000) {
						polygon(paths = [[0, 1, 2, 3]], points = [[895, 2125], [895, 2465], [1370, 2465], [1370, 2125]]);
					}
				}
			}
			color(c = [0.9000000000, 0.6000000000, 0.6000000000]) {
				translate(v = [0, 0, 2176.1000000000]) {
					linear_extrude(height = 100.0000000000) {
						polygon(paths = [[0, 1, 2, 3, 4, 5, 6, 7, 8, 9, 10, 11, 12, 13]], points = [[1980, 255], [1980, 715], [2060, 715], [2060, 1445], [2075, 1445], [2075, 1795], [1970, 1795], [1970, 2465], [2245, 2465], [2245, 1445], [2675, 1445], [2675, 925], [2230, 925], [2230, 255]]);
					}
				}
			}
			color(c = [0.9000000000, 0.6000000000, 0.6000000000]) {
				translate(v = [0, 0, 2176.1000000000]) {
					linear_extrude(height = 100.0000000000) {
						polygon(paths = [[0, 1, 2, 3, 4, 5, 6, 7, 8, 9, 10, 11, 12, 13, 14, 15, 16, 17, 18, 19]], points = [[2415, 1625], [2415, 2635], [1770, 2635], [1770, 1790], [1555, 1790], [1555, 2635], [715, 2635], [715, 1955], [855, 1955], [855, 1765], [525, 1765], [525, 2130], [85, 2130], [85, 2635], [0, 2635], [0, 2805], [2760, 2805], [2760, 2635], [2675, 2635], [2675, 1625]]);
					}
				}
			}
			color(c = [0.5000000000, 0.5000000000, 0.5000000000]) {
				translate(v = [0, 0, 2276.1000000000]) {
					linear_extrude(height = 340.0000000000) {
						polygon(paths = [[0, 1, 2, 3]], points = [[145, -85], [145, 85], [315, 85], [315, -85]]);
					}
				}
			}
			color(c = [0.5000000000, 0.5000000000, 0.5000000000]) {
				translate(v = [0, 0, 2276.1000000000]) {
					linear_extrude(height = 340.0000000000) {
						polygon(paths = [[0, 1, 2, 3]], points = [[605, -85], [605, 85], [775, 85], [775, -85]]);
					}
				}
			}
			color(c = [0.5000000000, 0.5000000000, 0.5000000000]) {
				translate(v = [0, 0, 2276.1000000000]) {
					linear_extrude(height = 340.0000000000) {
						polygon(paths = [[0, 1, 2, 3]], points = [[1065, -85], [1065, 85], [1235, 85], [1235, -85]]);
					}
				}
			}
			color(c = [0.5000000000, 0.5000000000, 0.5000000000]) {
				translate(v = [0, 0, 2276.1000000000]) {
					linear_extrude(height = 340.0000000000) {
						polygon(paths = [[0, 1, 2, 3]], points = [[1525, -85], [1525, 85], [1695, 85], [1695, -85]]);
					}
				}
			}
			color(c = [0.5000000000, 0.5000000000, 0.5000000000]) {
				translate(v = [0, 0, 2276.1000000000]) {
					linear_extrude(height = 340.0000000000) {
						polygon(paths = [[0, 1, 2, 3]], points = [[1985, -85], [1985, 85], [2155, 85], [2155, -85]]);
					}
				}
			}
			color(c = [0.5000000000, 0.5000000000, 0.5000000000]) {
				translate(v = [0, 0, 2276.1000000000]) {
					linear_extrude(height = 340.0000000000) {
						polygon(paths = [[0, 1, 2, 3]], points = [[2445, -85], [2445, 85], [2615, 85], [2615, -85]]);
					}
				}
			}
			color(c = [0.5000000000, 0.5000000000, 0.5000000000]) {
				translate(v = [0, 0, 2276.1000000000]) {
					linear_extrude(height = 340.0000000000) {
						polygon(paths = [[0, 1, 2, 3]], points = [[145, 2635], [145, 2805], [315, 2805], [315, 2635]]);
					}
				}
			}
			color(c = [0.5000000000, 0.5000000000, 0.5000000000]) {
				translate(v = [0, 0, 2276.1000000000]) {
					linear_extrude(height = 340.0000000000) {
						polygon(paths = [[0, 1, 2, 3]], points = [[605, 2635], [605, 2805], [775, 2805], [775, 2635]]);
					}
				}
			}
			color(c = [0.5000000000, 0.5000000000, 0.5000000000]) {
				translate(v = [0, 0, 2276.1000000000]) {
					linear_extrude(height = 340.0000000000) {
						polygon(paths = [[0, 1, 2, 3]], points = [[1065, 2635], [1065, 2805], [1235, 2805], [1235, 2635]]);
					}
				}
			}
			color(c = [0.5000000000, 0.5000000000, 0.5000000000]) {
				translate(v = [0, 0, 2276.1000000000]) {
					linear_extrude(height = 340.0000000000) {
						polygon(paths = [[0, 1, 2, 3]], points = [[1525, 2635], [1525, 2805], [1695, 2805], [1695, 2635]]);
					}
				}
			}
			color(c = [0.5000000000, 0.5000000000, 0.5000000000]) {
				translate(v = [0, 0, 2276.1000000000]) {
					linear_extrude(height = 340.0000000000) {
						polygon(paths = [[0, 1, 2, 3]], points = [[1985, 2635], [1985, 2805], [2155, 2805], [2155, 2635]]);
					}
				}
			}
			color(c = [0.5000000000, 0.5000000000, 0.5000000000]) {
				translate(v = [0, 0, 2276.1000000000]) {
					linear_extrude(height = 340.0000000000) {
						polygon(paths = [[0, 1, 2, 3]], points = [[2445, 2635], [2445, 2805], [2615, 2805], [2615, 2635]]);
					}
				}
			}
			color(c = [0.3000000000, 0.3000000000, 1]) {
				translate(v = [0, 0, 2616.1000000000]) {
					linear_extrude(height = 360.0000000000) {
						polygon(paths = [[0, 1, 2, 3]], points = [[0, -240], [0, 240], [2760, 240], [2760, -240]]);
					}
				}
			}
			color(c = [0.3000000000, 0.3000000000, 1]) {
				translate(v = [0, 0, 2616.1000000000]) {
					linear_extrude(height = 360.0000000000) {
						polygon(paths = [[0, 1, 2, 3]], points = [[0, 2480], [0, 2960], [2760, 2960], [2760, 2480]]);
					}
				}
			}
		}
	}
}
